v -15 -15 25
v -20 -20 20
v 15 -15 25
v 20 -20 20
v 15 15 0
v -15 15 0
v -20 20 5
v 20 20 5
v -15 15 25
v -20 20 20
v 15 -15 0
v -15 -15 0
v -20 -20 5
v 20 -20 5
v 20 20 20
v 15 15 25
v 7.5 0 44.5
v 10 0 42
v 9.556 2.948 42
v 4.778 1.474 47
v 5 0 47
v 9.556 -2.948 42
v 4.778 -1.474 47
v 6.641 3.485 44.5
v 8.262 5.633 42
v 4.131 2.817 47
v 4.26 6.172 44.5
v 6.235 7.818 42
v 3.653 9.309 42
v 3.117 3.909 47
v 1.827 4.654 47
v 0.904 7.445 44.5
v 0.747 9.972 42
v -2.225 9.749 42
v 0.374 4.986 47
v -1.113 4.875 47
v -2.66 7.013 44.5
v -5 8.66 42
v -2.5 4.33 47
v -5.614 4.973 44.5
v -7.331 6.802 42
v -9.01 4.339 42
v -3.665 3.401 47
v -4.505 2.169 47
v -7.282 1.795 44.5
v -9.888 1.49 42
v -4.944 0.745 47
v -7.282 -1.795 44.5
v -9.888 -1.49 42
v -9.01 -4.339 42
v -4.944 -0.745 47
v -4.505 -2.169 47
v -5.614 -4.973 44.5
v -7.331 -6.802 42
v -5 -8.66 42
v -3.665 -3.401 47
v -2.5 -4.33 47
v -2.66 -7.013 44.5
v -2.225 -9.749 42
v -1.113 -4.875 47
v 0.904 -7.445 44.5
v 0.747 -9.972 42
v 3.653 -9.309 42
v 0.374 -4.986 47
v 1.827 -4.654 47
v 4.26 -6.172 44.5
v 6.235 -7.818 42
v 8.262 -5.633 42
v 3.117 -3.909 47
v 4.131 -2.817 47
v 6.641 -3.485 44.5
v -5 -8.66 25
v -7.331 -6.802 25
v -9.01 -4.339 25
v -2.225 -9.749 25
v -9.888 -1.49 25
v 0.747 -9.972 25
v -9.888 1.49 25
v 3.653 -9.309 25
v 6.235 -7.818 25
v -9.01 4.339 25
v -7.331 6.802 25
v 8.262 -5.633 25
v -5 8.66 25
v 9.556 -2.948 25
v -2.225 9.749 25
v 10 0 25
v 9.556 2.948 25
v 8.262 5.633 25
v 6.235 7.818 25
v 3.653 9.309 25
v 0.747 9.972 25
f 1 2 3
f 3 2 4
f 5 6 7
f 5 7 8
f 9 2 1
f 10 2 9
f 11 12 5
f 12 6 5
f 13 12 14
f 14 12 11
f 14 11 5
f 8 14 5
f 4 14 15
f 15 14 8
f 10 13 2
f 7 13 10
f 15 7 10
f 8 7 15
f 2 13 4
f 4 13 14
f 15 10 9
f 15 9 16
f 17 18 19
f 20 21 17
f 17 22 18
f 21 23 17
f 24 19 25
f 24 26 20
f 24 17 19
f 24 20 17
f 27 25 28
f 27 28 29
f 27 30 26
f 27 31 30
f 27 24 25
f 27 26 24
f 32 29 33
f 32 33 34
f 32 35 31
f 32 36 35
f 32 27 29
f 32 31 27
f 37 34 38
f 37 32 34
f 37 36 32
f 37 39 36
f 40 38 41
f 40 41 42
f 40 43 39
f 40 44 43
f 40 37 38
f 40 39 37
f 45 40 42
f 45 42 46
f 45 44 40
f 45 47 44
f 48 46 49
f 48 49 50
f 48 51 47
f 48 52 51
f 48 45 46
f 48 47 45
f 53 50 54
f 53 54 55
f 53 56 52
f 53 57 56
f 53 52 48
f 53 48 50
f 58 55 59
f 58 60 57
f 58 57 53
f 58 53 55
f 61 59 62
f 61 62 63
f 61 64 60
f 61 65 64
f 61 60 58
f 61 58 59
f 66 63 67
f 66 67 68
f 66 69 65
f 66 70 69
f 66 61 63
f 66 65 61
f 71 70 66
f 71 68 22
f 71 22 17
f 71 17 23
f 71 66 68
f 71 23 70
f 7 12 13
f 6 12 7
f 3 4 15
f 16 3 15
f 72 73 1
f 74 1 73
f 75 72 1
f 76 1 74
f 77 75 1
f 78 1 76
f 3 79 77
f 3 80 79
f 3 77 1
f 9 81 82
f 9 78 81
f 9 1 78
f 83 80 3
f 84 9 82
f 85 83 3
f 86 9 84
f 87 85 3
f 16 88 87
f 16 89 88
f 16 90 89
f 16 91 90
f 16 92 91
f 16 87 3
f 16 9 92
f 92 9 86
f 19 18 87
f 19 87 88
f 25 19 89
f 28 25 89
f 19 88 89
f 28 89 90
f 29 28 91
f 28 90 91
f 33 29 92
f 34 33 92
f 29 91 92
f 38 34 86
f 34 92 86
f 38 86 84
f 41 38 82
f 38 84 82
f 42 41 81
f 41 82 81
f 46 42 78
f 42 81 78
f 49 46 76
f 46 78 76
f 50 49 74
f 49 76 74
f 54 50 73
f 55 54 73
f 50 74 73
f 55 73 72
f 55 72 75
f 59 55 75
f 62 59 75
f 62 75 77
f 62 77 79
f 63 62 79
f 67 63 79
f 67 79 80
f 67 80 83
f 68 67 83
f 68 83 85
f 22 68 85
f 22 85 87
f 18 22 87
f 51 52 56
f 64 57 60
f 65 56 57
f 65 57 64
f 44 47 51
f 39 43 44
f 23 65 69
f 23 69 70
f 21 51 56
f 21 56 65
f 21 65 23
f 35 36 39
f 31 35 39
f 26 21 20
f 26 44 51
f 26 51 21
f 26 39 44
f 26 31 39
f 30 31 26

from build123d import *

# Parameters (mm, degrees)
F0_W     = 40
F0_H     = 40
F0_R     = 10
F1_DEPTH = 25
F2_DEPTH = 47
F3_SIZE  = 5


with BuildPart() as f1:
    # F0 (on Top) → F1 (new body)
    with BuildSketch(Plane.XY):
        Rectangle(F0_W, F0_H)
        Circle(F0_R, mode=Mode.SUBTRACT)
    extrude(amount=F1_DEPTH)

    # F0 (on Top) → F2 (join)
    with BuildSketch(Plane.XY):
        Circle(F0_R)
    extrude(amount=F2_DEPTH)

    # F3
    f3_edges = [f1.edges().sort_by_distance(p)[0] for p in [
        (0, 20, 25),
        (20, 0, 25),
        (0, -20, 0),
        (20, 0, 0),
        (0, 20, 0),
        (-20, 0, 0),
        (0, -20, 25),
        (-20, 0, 25),
        (-10, 0, 47),
    ]]
    chamfer(f3_edges, length=F3_SIZE)


solid = f1.part
